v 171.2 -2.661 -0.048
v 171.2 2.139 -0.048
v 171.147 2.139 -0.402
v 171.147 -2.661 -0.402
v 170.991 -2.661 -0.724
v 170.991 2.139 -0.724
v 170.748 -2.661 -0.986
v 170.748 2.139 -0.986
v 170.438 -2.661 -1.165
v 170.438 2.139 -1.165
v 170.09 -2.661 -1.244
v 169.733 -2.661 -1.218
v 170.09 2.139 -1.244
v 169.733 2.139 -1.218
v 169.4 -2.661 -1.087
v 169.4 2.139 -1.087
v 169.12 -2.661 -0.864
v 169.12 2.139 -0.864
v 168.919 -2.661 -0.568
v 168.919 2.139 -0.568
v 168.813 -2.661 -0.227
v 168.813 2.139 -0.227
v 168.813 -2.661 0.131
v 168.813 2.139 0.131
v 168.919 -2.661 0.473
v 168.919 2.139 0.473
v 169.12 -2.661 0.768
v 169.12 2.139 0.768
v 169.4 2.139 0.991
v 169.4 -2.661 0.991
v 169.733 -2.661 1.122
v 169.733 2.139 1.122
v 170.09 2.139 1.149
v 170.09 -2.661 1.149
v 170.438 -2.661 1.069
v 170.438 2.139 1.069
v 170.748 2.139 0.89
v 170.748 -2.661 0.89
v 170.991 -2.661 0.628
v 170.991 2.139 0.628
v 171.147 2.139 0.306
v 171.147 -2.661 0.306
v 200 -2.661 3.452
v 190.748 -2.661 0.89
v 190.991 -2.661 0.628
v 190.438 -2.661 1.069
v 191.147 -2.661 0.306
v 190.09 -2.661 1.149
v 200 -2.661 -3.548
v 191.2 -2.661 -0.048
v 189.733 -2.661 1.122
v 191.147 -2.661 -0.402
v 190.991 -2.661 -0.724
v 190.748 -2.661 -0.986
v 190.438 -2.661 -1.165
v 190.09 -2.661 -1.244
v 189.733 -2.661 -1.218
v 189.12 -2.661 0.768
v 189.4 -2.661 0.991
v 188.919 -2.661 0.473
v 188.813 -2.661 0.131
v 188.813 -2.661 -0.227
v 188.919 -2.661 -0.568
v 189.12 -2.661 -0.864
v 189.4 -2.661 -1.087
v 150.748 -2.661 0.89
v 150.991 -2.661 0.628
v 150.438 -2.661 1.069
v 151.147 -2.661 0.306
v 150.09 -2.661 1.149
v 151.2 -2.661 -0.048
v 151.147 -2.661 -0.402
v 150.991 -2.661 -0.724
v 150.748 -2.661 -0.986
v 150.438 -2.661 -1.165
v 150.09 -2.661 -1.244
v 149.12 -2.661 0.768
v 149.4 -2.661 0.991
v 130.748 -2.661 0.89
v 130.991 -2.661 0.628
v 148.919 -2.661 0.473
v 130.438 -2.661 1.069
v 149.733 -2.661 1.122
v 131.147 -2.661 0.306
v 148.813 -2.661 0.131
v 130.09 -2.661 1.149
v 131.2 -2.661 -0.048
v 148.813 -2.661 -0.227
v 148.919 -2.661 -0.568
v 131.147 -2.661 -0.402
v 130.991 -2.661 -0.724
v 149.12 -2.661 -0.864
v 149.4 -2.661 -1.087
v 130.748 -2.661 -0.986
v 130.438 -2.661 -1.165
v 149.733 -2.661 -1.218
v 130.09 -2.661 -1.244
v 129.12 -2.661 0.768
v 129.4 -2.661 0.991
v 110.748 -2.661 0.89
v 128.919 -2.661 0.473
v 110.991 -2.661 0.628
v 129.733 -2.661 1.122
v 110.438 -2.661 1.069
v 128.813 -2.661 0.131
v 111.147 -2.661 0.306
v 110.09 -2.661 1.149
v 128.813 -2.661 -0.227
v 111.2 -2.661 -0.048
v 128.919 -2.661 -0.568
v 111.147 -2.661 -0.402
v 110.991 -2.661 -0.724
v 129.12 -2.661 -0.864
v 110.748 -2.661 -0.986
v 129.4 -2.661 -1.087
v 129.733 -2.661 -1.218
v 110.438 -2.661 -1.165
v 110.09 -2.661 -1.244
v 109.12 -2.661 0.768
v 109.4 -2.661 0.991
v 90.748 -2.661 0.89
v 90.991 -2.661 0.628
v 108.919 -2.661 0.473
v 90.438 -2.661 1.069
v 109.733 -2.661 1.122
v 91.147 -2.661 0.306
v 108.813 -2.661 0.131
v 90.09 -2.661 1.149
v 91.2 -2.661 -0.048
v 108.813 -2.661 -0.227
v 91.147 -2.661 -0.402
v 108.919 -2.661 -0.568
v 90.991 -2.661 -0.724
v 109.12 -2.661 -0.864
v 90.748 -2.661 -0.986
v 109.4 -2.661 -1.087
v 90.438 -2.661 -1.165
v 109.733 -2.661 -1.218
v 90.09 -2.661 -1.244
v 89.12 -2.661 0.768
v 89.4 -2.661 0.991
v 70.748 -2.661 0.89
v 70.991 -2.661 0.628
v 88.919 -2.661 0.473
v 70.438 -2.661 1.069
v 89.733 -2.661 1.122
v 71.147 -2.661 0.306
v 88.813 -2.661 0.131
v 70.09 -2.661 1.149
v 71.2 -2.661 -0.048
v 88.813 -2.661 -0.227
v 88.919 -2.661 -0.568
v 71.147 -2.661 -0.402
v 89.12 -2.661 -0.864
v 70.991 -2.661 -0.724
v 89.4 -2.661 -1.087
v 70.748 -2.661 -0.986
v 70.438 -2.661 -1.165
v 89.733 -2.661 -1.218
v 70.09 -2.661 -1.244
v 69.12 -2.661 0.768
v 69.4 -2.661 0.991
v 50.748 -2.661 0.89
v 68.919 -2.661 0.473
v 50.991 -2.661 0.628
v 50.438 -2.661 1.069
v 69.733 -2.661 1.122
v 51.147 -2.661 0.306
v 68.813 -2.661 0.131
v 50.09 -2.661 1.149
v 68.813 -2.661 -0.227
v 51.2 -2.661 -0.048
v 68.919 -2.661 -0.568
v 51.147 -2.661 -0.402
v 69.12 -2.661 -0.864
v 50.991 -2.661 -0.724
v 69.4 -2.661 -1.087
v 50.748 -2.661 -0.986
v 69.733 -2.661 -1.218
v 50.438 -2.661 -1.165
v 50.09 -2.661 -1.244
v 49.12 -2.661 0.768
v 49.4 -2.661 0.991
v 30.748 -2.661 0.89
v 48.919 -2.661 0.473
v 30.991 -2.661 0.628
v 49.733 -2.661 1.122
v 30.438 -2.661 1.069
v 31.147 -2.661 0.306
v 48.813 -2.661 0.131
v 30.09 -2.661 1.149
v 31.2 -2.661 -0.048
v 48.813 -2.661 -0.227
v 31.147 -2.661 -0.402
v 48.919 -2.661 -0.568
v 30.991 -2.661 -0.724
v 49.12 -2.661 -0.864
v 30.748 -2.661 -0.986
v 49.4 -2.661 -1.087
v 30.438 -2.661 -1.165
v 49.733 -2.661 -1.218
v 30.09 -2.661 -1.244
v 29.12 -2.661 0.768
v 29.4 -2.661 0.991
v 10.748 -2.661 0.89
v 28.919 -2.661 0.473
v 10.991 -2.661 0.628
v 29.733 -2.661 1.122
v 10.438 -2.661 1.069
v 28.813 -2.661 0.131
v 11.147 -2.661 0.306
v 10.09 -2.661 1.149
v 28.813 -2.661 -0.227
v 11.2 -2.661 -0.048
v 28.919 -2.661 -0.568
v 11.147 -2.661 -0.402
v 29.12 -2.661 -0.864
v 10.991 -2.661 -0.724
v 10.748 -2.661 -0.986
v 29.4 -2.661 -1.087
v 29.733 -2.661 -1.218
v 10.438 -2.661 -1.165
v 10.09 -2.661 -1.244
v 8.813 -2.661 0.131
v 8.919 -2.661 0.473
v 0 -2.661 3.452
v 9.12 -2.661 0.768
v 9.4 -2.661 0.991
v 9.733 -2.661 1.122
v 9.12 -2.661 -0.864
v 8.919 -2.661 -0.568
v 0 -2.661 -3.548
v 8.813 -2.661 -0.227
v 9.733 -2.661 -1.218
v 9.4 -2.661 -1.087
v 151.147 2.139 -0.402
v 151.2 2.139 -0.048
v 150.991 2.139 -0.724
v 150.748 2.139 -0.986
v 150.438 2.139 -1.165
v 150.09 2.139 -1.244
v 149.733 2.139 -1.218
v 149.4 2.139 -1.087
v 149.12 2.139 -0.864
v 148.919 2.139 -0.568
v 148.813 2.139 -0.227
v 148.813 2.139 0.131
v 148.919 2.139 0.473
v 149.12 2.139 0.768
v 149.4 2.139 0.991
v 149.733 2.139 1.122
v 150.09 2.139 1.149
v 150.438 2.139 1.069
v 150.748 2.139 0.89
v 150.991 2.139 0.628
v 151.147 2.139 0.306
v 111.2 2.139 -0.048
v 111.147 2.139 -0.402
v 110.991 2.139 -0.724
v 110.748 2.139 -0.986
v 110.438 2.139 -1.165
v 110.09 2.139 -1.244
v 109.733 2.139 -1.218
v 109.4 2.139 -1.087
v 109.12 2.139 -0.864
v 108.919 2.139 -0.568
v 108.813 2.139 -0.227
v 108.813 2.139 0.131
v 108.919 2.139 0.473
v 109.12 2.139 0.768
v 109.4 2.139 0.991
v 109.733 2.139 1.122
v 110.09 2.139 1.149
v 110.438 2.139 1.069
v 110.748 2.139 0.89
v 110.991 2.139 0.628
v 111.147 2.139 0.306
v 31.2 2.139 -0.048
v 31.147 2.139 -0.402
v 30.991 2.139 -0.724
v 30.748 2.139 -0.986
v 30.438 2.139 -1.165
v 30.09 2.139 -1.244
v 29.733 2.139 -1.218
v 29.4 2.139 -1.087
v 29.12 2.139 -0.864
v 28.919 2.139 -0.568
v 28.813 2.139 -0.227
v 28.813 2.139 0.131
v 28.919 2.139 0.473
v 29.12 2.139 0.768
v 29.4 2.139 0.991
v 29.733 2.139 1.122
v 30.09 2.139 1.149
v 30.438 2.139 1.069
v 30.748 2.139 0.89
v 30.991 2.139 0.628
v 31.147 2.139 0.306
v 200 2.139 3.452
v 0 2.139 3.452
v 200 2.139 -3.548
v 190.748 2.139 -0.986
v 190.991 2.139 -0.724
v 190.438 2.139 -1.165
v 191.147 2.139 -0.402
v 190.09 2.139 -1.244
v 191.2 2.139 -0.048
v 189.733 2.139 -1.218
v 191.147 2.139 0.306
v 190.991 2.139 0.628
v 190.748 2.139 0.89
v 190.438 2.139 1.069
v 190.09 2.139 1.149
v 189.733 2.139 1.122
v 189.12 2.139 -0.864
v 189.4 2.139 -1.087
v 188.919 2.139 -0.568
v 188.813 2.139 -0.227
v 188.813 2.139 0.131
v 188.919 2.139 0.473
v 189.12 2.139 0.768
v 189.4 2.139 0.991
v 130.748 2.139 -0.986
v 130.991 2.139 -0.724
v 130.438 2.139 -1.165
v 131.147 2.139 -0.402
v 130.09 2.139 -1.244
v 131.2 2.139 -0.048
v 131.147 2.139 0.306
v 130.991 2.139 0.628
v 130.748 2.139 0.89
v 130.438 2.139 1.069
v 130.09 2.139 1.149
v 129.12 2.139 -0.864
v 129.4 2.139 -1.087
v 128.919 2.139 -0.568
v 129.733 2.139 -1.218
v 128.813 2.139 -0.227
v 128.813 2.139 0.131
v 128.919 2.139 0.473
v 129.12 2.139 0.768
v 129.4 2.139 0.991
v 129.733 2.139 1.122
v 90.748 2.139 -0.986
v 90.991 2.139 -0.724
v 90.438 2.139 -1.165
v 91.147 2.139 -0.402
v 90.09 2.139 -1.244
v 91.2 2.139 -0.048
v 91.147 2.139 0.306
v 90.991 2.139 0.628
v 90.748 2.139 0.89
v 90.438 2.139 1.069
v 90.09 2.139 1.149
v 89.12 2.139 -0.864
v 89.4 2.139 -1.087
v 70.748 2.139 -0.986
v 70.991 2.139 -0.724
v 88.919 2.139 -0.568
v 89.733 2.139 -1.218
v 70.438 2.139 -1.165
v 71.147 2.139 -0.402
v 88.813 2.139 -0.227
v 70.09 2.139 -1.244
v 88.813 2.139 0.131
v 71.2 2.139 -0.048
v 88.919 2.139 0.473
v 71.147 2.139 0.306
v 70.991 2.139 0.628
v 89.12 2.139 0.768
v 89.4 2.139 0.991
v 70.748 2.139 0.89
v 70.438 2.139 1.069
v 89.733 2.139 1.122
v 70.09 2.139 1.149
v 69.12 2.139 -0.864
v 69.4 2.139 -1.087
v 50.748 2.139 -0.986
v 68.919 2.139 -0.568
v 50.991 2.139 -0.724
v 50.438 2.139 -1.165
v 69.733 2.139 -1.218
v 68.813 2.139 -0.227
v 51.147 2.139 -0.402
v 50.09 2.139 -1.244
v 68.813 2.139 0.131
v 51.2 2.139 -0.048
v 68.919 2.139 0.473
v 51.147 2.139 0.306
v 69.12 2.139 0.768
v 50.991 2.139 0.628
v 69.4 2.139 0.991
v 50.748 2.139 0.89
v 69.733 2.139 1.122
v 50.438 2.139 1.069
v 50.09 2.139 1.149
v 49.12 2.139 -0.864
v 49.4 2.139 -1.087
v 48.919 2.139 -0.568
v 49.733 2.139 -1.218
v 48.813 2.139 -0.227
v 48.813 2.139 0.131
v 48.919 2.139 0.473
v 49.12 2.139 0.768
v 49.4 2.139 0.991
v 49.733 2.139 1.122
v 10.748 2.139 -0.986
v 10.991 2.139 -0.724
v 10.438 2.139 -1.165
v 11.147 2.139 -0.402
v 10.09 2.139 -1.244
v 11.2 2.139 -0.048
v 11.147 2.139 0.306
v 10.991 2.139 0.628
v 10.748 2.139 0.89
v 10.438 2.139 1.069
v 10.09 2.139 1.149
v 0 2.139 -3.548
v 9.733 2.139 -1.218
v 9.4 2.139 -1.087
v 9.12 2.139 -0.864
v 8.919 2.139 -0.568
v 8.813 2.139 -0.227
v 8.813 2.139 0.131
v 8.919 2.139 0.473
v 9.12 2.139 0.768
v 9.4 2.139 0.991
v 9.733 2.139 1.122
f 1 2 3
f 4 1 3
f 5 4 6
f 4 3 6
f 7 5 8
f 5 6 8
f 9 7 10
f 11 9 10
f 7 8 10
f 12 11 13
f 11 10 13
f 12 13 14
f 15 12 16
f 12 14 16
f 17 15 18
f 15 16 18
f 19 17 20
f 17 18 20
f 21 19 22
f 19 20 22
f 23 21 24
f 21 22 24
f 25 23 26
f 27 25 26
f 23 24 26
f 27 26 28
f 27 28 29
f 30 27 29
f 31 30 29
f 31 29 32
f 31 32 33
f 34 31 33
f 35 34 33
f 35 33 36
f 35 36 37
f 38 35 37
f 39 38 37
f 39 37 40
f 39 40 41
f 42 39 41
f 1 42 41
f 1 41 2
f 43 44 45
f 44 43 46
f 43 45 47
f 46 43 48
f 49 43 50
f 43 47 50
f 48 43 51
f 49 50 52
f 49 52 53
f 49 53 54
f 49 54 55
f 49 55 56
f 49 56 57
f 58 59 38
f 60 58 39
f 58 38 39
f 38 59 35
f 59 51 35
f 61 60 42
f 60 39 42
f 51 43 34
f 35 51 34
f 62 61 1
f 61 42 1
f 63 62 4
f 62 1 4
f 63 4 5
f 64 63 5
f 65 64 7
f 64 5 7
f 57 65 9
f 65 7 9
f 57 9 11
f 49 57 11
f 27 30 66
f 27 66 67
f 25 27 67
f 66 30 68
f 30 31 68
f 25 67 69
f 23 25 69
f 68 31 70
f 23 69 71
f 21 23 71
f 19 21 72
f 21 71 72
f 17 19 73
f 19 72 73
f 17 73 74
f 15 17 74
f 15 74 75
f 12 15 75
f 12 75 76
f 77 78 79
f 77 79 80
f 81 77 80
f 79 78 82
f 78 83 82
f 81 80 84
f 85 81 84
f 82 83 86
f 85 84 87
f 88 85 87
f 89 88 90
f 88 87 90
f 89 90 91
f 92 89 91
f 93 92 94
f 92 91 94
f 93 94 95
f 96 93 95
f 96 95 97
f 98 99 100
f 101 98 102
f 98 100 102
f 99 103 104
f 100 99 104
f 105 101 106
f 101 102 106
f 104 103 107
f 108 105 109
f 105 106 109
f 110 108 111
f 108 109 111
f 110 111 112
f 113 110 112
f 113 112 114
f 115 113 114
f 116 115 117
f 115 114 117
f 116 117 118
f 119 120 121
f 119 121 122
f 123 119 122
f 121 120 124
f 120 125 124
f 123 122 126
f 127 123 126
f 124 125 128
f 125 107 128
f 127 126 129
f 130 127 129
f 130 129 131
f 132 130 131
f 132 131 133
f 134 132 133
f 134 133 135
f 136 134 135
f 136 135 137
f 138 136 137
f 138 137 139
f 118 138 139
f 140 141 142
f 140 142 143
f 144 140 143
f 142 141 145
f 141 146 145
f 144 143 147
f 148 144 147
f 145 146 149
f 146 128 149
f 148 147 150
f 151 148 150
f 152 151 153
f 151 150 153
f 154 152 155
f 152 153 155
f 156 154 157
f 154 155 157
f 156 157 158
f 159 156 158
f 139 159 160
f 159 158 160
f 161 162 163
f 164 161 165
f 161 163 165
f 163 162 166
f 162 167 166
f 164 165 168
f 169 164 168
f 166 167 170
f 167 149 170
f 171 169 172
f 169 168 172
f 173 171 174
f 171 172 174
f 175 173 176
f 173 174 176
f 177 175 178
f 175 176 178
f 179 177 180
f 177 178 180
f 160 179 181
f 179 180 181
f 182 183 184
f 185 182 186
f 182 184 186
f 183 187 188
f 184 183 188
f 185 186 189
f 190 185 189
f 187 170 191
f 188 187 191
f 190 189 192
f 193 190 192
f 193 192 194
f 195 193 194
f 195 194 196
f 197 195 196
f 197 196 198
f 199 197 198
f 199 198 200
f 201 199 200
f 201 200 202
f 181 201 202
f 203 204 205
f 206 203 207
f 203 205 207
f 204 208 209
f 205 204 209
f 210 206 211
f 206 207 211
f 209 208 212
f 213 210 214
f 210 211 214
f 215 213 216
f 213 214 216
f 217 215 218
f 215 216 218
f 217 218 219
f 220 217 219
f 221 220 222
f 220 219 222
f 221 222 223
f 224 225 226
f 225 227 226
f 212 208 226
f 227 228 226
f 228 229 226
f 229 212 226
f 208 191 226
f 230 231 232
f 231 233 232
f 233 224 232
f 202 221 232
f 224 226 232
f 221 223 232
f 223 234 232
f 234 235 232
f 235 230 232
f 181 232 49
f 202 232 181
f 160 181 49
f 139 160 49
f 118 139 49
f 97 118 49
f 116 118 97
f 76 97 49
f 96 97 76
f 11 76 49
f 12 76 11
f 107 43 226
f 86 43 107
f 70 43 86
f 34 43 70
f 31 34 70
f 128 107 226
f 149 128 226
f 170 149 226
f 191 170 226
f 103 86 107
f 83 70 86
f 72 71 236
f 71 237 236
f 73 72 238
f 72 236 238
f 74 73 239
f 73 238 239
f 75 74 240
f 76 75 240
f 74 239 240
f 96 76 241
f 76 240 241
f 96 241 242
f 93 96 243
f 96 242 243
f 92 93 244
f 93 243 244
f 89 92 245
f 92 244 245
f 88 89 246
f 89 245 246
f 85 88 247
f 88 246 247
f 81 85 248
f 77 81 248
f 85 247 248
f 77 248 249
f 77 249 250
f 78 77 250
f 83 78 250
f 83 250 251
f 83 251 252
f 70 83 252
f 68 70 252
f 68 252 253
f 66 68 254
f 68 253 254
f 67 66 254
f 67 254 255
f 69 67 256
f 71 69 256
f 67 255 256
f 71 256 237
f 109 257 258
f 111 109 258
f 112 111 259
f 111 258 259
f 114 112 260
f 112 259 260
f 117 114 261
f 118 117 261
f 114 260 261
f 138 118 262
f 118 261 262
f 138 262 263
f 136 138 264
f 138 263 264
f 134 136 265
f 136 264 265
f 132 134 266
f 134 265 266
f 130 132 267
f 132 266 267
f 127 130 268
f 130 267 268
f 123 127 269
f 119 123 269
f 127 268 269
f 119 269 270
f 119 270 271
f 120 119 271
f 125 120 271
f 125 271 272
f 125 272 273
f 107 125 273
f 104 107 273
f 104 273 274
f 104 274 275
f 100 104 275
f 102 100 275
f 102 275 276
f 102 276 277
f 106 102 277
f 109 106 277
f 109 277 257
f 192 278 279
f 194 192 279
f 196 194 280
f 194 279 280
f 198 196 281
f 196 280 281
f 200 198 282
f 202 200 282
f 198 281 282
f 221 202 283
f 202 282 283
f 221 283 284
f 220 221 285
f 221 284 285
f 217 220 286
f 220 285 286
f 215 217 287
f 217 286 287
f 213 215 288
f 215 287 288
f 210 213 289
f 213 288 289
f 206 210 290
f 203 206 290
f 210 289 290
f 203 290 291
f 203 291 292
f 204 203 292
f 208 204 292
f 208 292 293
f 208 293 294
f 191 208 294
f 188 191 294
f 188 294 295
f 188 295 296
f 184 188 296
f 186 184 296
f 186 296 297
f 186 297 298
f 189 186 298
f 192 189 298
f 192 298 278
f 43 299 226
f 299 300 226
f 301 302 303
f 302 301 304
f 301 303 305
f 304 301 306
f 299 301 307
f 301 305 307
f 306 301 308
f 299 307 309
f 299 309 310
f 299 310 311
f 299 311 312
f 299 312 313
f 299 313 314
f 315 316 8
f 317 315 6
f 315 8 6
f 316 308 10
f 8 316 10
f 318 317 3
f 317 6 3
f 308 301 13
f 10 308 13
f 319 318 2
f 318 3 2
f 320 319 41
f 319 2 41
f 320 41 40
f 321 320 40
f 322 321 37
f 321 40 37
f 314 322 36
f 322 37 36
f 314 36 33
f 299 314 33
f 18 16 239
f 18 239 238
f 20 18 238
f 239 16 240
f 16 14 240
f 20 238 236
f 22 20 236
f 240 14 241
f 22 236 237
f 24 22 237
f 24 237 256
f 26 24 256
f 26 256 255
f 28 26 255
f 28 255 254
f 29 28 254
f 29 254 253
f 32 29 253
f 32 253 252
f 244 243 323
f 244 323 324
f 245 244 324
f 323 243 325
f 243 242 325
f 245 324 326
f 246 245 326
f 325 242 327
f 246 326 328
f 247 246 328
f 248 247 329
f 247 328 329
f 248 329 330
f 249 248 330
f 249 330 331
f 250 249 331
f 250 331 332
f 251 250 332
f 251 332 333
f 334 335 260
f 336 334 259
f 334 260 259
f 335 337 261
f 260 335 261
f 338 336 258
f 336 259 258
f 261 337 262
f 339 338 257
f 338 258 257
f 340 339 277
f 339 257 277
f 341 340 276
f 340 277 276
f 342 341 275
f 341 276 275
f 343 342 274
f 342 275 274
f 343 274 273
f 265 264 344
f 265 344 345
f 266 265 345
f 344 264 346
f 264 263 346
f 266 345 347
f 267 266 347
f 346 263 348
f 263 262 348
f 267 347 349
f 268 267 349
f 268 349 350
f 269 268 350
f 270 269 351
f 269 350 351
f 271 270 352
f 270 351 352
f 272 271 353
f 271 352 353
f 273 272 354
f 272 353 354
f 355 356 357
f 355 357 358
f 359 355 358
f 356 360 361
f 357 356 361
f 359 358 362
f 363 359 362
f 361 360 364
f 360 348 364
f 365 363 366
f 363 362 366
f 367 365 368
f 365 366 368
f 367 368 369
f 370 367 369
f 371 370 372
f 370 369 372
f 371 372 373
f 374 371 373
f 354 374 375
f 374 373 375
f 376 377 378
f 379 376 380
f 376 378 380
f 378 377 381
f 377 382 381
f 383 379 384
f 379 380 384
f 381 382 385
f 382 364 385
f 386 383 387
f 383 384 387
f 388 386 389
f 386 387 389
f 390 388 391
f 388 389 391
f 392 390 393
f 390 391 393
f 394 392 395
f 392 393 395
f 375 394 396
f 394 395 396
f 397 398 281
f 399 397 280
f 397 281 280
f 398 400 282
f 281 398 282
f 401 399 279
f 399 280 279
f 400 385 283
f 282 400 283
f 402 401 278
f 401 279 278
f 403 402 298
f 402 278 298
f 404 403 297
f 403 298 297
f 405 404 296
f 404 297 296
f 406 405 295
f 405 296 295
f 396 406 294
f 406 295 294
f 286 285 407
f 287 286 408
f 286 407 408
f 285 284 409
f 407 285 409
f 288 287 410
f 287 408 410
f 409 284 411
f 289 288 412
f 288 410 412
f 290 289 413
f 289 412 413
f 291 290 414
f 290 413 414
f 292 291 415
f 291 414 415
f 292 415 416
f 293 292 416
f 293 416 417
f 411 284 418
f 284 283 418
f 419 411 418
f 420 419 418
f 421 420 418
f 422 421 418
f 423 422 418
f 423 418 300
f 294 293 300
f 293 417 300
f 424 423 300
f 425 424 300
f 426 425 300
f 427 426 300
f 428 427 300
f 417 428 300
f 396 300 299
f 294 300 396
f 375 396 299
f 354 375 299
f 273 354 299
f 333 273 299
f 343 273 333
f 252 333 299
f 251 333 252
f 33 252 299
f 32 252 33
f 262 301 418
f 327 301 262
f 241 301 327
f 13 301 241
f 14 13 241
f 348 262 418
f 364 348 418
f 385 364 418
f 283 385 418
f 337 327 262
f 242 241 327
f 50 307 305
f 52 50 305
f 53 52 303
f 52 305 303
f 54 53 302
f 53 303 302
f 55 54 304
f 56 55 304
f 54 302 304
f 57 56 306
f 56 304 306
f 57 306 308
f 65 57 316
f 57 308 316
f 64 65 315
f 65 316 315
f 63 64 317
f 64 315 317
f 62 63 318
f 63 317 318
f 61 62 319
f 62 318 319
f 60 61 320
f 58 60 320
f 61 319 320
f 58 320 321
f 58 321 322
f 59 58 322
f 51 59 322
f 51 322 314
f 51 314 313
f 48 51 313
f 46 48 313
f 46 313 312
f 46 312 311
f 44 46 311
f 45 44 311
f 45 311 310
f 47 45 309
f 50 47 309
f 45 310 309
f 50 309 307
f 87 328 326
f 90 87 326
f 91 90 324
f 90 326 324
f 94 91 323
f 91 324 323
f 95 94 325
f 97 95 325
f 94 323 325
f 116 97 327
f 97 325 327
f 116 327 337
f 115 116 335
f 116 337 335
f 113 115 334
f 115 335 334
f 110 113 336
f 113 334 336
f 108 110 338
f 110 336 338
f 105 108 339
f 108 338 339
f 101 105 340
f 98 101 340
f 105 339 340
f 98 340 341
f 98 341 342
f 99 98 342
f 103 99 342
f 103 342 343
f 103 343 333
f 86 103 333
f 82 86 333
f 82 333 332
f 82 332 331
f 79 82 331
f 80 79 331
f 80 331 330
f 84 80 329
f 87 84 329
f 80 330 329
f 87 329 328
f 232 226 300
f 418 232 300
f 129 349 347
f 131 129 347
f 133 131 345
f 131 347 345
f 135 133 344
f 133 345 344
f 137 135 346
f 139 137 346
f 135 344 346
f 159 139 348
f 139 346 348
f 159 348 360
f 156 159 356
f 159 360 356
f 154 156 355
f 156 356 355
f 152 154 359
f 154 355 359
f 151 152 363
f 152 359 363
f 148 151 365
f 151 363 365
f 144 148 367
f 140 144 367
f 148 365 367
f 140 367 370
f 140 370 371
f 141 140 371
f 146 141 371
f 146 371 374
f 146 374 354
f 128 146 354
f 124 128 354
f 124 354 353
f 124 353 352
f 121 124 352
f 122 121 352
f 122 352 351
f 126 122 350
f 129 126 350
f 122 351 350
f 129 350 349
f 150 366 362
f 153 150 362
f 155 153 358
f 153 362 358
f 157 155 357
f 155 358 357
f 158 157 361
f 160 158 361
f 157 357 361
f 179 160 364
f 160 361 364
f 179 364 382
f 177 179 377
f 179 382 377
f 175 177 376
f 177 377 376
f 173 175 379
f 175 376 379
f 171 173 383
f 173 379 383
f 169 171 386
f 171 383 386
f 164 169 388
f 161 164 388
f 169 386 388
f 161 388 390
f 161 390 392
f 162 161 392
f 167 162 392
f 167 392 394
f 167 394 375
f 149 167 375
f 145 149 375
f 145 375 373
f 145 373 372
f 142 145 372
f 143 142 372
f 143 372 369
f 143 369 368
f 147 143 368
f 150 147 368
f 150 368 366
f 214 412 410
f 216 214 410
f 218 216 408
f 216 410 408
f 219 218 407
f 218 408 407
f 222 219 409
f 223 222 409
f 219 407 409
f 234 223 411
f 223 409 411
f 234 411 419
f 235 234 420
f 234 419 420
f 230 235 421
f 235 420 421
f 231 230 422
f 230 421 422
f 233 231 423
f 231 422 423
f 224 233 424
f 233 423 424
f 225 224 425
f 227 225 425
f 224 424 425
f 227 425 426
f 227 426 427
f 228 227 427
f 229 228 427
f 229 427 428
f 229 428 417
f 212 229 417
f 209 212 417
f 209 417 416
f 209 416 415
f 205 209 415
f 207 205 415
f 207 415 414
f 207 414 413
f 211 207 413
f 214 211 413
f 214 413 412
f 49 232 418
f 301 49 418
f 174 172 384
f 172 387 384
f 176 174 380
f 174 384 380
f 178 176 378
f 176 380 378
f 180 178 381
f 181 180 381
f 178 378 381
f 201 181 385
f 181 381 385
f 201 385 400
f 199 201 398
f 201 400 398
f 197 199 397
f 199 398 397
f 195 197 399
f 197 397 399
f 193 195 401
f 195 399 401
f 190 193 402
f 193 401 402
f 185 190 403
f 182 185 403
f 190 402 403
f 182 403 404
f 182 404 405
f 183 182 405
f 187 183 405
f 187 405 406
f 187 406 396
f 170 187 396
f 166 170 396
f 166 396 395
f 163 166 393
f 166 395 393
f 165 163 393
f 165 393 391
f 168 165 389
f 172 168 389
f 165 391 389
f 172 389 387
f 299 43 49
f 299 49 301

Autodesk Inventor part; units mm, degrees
ref_plane "YZ Plane" through (0, 0, 0) normal (1, 0, 0) x (0, 1, 0)
ref_plane "XZ Plane" through (0, 0, 0) normal (0, 1, 0) x (-1, 0, 0)
ref_plane "XY Plane" through (0, 0, 0) normal (0, 0, 1) x (1, 0, 0)
sketch "Sketch1" plane through (0, 0, 0) normal (1, 0, 0) x (0, 1, 0)
  line L0 (2.1391, 3.4522) -> (-2.6609, 3.4522)
  line L1 (-2.6609, 3.4522) -> (-2.6609, -3.5478)
  line L2 (-2.6609, -3.5478) -> (2.1391, -3.5478)
  line L3 (2.1391, -3.5478) -> (2.1391, 3.4522)
  point P0 (0, 0)
  dimension "d0" = 4.8
  dimension "d1" = 7
extrude "Extrusion1" add sketch "Sketch1" along normal blind 200
sketch "Sketch2" plane through (0, 2.1391, 3.4522) normal (0, 1, 0) x (1, 0, 0)
  circle A0 centre (10, 3.5) radius 1.2
  line L0 (0, 7) -> (0, 0) projected
  line L1 (0, 0) -> (200, 0) projected
  circle A1 centre (30, 3.5) radius 1.2
  circle A2 centre (50, 3.5) radius 1.2
  circle A3 centre (70, 3.5) radius 1.2
  circle A4 centre (90, 3.5) radius 1.2
  circle A5 centre (110, 3.5) radius 1.2
  circle A6 centre (130, 3.5) radius 1.2
  circle A7 centre (150, 3.5) radius 1.2
  circle A8 centre (170, 3.5) radius 1.2
  circle A9 centre (190, 3.5) radius 1.2
  point P0 (0, 3.4522)
  dimension "d4" = 2.4
  dimension "d5" = 10
  dimension "d6" = 3.5
  dimension "d9" = 20
extrude "Extrusion2" cut sketch "Sketch2" against normal through all
properties part number "MGN7Cx200mm_rail"
